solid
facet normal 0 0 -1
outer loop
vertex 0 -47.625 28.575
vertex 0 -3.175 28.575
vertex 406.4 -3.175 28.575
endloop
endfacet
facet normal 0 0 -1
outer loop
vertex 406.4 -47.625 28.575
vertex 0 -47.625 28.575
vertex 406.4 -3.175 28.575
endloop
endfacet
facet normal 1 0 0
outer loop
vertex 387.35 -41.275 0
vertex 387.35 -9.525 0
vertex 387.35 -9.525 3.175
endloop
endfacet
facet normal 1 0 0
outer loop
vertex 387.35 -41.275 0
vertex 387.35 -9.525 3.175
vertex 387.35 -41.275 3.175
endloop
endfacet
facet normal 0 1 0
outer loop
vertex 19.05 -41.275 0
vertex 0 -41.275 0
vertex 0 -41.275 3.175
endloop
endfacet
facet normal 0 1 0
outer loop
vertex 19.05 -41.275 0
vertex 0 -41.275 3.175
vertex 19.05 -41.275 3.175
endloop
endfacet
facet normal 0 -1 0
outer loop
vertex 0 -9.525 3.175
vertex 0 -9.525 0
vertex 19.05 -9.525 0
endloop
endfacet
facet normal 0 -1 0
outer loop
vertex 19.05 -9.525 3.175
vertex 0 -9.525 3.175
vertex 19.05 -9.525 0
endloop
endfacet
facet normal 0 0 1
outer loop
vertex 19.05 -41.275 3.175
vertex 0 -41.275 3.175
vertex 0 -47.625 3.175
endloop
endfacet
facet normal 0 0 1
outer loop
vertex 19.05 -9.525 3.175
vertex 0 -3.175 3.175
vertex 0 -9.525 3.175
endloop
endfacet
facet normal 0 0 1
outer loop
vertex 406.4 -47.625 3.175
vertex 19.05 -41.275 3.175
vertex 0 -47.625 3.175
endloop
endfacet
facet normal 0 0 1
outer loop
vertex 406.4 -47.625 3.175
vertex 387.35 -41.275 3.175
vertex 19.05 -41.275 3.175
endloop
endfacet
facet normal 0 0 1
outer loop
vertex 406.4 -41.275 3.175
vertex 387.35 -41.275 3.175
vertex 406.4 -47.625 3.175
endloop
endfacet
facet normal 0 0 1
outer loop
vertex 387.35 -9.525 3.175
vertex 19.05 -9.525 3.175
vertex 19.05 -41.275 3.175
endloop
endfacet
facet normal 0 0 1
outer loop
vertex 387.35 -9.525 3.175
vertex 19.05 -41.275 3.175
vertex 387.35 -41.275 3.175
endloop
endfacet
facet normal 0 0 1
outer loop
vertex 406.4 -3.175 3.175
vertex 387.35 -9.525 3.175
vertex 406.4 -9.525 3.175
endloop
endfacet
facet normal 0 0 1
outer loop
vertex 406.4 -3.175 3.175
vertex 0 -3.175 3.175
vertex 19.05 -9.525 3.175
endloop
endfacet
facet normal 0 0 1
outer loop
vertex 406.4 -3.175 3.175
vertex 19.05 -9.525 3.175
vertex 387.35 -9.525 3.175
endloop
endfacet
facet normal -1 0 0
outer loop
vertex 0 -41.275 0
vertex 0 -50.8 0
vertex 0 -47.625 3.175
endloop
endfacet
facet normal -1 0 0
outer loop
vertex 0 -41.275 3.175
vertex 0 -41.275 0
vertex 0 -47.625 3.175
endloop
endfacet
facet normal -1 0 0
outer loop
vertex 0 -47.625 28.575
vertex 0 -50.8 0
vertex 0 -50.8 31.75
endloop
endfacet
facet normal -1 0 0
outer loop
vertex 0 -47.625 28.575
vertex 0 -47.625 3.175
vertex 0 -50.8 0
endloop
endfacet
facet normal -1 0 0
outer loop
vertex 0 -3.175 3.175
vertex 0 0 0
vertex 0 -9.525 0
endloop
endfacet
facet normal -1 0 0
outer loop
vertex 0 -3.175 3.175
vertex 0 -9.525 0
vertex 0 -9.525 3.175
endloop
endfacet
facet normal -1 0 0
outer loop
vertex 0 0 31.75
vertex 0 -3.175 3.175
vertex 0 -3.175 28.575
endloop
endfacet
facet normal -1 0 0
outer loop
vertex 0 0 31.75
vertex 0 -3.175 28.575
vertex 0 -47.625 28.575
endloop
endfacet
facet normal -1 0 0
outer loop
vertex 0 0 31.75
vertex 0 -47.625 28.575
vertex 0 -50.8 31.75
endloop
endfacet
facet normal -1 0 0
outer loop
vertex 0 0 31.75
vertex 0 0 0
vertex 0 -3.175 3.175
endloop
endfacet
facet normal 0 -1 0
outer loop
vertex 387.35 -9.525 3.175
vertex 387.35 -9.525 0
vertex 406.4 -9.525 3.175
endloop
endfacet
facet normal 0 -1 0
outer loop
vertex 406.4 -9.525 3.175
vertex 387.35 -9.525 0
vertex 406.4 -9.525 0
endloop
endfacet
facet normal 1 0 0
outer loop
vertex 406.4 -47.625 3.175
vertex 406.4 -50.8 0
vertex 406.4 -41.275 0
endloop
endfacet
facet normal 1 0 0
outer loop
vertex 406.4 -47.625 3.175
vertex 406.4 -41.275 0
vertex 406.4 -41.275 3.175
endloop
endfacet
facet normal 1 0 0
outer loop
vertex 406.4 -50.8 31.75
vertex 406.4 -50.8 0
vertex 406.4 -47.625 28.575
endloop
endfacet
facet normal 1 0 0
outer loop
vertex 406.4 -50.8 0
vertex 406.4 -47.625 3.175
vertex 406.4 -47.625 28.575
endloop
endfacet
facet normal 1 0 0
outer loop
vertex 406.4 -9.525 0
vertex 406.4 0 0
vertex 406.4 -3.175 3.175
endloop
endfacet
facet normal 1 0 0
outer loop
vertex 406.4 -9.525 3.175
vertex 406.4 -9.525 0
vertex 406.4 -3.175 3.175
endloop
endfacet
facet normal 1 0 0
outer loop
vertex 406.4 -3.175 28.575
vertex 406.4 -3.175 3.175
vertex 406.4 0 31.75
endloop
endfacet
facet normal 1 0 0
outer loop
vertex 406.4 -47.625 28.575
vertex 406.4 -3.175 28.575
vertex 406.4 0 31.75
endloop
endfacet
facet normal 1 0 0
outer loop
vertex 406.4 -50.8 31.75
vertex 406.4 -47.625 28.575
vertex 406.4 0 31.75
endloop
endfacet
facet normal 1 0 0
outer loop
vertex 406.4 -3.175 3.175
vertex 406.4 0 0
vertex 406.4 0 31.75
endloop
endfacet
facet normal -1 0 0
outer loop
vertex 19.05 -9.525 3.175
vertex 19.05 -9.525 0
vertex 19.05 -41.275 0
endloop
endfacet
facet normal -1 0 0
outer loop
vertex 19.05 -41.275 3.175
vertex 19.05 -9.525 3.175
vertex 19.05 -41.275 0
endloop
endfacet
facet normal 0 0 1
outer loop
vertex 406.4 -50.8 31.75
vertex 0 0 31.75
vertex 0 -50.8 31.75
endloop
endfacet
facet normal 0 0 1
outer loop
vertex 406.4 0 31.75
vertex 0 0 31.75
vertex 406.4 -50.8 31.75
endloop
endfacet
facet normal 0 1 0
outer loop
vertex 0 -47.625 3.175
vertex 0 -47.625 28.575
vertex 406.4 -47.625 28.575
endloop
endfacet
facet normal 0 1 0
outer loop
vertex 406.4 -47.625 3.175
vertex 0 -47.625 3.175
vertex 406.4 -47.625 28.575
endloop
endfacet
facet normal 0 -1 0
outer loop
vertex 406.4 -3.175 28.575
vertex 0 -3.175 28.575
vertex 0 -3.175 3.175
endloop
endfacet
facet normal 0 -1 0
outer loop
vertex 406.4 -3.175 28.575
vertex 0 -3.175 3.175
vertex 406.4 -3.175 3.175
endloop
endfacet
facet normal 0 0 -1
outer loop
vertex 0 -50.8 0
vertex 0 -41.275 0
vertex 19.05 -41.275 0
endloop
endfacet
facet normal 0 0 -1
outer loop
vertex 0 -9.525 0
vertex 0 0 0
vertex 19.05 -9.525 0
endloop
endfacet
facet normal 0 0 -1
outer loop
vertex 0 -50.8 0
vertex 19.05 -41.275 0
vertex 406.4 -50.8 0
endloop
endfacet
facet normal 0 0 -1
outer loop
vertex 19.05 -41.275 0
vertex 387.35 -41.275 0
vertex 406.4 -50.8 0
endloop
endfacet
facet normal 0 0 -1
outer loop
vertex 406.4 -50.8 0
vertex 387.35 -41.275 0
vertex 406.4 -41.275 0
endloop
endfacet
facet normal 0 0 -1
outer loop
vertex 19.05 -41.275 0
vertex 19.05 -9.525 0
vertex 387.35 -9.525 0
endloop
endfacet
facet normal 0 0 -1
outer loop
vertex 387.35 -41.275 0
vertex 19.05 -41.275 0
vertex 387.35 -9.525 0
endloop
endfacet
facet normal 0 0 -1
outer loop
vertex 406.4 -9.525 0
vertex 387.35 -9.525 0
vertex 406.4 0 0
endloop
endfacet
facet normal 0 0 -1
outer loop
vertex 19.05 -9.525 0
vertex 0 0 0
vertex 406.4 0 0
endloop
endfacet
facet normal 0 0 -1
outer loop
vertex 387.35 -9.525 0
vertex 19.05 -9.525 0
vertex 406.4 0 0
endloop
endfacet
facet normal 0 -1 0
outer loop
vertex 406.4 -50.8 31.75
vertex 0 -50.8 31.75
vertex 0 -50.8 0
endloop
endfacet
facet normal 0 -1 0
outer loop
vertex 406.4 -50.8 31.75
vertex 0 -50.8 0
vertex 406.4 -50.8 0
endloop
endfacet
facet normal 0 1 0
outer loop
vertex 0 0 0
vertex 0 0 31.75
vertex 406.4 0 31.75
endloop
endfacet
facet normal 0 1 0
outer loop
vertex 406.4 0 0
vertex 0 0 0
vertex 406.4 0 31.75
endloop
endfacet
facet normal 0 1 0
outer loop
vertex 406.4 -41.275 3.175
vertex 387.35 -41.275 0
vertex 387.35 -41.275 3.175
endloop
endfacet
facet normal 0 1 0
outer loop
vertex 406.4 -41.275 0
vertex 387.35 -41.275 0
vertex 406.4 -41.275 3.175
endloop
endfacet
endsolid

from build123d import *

# Parameters (mm, degrees)
F0_W     = 406.4
F0_H     = 31.75
F1_DEPTH = 50.8
F2_T     = -3.175
F3_W     = 19.05
F3_H     = 31.75
F4_DEPTH = 3.175


with BuildPart() as f1:
    # F0 (on Front) → F1 (new body)
    with BuildSketch(Plane.XZ):
        with Locations((203.2, 15.875)):
            Rectangle(F0_W, F0_H)
    extrude(amount=F1_DEPTH)

    # F2
    f2_openings = [f1.faces().sort_by_distance(p)[0] for p in [
        (0, -25.4, 15.875),
        (406.4, -25.4, 15.875),
    ]]
    offset(amount=F2_T, openings=f2_openings)

    # F3 (on face) → F4 (cut)
    with BuildSketch(Plane(origin=(0, 0, 0), x_dir=(1, 0, 0), z_dir=(0, 0, -1))):
        with Locations((9.525, 25.4)):
            Rectangle(F3_W, F3_H)
        with Locations((396.875, 25.4)):
            Rectangle(F3_W, F3_H)
    extrude(amount=-F4_DEPTH, mode=Mode.SUBTRACT)


solid = f1.part
